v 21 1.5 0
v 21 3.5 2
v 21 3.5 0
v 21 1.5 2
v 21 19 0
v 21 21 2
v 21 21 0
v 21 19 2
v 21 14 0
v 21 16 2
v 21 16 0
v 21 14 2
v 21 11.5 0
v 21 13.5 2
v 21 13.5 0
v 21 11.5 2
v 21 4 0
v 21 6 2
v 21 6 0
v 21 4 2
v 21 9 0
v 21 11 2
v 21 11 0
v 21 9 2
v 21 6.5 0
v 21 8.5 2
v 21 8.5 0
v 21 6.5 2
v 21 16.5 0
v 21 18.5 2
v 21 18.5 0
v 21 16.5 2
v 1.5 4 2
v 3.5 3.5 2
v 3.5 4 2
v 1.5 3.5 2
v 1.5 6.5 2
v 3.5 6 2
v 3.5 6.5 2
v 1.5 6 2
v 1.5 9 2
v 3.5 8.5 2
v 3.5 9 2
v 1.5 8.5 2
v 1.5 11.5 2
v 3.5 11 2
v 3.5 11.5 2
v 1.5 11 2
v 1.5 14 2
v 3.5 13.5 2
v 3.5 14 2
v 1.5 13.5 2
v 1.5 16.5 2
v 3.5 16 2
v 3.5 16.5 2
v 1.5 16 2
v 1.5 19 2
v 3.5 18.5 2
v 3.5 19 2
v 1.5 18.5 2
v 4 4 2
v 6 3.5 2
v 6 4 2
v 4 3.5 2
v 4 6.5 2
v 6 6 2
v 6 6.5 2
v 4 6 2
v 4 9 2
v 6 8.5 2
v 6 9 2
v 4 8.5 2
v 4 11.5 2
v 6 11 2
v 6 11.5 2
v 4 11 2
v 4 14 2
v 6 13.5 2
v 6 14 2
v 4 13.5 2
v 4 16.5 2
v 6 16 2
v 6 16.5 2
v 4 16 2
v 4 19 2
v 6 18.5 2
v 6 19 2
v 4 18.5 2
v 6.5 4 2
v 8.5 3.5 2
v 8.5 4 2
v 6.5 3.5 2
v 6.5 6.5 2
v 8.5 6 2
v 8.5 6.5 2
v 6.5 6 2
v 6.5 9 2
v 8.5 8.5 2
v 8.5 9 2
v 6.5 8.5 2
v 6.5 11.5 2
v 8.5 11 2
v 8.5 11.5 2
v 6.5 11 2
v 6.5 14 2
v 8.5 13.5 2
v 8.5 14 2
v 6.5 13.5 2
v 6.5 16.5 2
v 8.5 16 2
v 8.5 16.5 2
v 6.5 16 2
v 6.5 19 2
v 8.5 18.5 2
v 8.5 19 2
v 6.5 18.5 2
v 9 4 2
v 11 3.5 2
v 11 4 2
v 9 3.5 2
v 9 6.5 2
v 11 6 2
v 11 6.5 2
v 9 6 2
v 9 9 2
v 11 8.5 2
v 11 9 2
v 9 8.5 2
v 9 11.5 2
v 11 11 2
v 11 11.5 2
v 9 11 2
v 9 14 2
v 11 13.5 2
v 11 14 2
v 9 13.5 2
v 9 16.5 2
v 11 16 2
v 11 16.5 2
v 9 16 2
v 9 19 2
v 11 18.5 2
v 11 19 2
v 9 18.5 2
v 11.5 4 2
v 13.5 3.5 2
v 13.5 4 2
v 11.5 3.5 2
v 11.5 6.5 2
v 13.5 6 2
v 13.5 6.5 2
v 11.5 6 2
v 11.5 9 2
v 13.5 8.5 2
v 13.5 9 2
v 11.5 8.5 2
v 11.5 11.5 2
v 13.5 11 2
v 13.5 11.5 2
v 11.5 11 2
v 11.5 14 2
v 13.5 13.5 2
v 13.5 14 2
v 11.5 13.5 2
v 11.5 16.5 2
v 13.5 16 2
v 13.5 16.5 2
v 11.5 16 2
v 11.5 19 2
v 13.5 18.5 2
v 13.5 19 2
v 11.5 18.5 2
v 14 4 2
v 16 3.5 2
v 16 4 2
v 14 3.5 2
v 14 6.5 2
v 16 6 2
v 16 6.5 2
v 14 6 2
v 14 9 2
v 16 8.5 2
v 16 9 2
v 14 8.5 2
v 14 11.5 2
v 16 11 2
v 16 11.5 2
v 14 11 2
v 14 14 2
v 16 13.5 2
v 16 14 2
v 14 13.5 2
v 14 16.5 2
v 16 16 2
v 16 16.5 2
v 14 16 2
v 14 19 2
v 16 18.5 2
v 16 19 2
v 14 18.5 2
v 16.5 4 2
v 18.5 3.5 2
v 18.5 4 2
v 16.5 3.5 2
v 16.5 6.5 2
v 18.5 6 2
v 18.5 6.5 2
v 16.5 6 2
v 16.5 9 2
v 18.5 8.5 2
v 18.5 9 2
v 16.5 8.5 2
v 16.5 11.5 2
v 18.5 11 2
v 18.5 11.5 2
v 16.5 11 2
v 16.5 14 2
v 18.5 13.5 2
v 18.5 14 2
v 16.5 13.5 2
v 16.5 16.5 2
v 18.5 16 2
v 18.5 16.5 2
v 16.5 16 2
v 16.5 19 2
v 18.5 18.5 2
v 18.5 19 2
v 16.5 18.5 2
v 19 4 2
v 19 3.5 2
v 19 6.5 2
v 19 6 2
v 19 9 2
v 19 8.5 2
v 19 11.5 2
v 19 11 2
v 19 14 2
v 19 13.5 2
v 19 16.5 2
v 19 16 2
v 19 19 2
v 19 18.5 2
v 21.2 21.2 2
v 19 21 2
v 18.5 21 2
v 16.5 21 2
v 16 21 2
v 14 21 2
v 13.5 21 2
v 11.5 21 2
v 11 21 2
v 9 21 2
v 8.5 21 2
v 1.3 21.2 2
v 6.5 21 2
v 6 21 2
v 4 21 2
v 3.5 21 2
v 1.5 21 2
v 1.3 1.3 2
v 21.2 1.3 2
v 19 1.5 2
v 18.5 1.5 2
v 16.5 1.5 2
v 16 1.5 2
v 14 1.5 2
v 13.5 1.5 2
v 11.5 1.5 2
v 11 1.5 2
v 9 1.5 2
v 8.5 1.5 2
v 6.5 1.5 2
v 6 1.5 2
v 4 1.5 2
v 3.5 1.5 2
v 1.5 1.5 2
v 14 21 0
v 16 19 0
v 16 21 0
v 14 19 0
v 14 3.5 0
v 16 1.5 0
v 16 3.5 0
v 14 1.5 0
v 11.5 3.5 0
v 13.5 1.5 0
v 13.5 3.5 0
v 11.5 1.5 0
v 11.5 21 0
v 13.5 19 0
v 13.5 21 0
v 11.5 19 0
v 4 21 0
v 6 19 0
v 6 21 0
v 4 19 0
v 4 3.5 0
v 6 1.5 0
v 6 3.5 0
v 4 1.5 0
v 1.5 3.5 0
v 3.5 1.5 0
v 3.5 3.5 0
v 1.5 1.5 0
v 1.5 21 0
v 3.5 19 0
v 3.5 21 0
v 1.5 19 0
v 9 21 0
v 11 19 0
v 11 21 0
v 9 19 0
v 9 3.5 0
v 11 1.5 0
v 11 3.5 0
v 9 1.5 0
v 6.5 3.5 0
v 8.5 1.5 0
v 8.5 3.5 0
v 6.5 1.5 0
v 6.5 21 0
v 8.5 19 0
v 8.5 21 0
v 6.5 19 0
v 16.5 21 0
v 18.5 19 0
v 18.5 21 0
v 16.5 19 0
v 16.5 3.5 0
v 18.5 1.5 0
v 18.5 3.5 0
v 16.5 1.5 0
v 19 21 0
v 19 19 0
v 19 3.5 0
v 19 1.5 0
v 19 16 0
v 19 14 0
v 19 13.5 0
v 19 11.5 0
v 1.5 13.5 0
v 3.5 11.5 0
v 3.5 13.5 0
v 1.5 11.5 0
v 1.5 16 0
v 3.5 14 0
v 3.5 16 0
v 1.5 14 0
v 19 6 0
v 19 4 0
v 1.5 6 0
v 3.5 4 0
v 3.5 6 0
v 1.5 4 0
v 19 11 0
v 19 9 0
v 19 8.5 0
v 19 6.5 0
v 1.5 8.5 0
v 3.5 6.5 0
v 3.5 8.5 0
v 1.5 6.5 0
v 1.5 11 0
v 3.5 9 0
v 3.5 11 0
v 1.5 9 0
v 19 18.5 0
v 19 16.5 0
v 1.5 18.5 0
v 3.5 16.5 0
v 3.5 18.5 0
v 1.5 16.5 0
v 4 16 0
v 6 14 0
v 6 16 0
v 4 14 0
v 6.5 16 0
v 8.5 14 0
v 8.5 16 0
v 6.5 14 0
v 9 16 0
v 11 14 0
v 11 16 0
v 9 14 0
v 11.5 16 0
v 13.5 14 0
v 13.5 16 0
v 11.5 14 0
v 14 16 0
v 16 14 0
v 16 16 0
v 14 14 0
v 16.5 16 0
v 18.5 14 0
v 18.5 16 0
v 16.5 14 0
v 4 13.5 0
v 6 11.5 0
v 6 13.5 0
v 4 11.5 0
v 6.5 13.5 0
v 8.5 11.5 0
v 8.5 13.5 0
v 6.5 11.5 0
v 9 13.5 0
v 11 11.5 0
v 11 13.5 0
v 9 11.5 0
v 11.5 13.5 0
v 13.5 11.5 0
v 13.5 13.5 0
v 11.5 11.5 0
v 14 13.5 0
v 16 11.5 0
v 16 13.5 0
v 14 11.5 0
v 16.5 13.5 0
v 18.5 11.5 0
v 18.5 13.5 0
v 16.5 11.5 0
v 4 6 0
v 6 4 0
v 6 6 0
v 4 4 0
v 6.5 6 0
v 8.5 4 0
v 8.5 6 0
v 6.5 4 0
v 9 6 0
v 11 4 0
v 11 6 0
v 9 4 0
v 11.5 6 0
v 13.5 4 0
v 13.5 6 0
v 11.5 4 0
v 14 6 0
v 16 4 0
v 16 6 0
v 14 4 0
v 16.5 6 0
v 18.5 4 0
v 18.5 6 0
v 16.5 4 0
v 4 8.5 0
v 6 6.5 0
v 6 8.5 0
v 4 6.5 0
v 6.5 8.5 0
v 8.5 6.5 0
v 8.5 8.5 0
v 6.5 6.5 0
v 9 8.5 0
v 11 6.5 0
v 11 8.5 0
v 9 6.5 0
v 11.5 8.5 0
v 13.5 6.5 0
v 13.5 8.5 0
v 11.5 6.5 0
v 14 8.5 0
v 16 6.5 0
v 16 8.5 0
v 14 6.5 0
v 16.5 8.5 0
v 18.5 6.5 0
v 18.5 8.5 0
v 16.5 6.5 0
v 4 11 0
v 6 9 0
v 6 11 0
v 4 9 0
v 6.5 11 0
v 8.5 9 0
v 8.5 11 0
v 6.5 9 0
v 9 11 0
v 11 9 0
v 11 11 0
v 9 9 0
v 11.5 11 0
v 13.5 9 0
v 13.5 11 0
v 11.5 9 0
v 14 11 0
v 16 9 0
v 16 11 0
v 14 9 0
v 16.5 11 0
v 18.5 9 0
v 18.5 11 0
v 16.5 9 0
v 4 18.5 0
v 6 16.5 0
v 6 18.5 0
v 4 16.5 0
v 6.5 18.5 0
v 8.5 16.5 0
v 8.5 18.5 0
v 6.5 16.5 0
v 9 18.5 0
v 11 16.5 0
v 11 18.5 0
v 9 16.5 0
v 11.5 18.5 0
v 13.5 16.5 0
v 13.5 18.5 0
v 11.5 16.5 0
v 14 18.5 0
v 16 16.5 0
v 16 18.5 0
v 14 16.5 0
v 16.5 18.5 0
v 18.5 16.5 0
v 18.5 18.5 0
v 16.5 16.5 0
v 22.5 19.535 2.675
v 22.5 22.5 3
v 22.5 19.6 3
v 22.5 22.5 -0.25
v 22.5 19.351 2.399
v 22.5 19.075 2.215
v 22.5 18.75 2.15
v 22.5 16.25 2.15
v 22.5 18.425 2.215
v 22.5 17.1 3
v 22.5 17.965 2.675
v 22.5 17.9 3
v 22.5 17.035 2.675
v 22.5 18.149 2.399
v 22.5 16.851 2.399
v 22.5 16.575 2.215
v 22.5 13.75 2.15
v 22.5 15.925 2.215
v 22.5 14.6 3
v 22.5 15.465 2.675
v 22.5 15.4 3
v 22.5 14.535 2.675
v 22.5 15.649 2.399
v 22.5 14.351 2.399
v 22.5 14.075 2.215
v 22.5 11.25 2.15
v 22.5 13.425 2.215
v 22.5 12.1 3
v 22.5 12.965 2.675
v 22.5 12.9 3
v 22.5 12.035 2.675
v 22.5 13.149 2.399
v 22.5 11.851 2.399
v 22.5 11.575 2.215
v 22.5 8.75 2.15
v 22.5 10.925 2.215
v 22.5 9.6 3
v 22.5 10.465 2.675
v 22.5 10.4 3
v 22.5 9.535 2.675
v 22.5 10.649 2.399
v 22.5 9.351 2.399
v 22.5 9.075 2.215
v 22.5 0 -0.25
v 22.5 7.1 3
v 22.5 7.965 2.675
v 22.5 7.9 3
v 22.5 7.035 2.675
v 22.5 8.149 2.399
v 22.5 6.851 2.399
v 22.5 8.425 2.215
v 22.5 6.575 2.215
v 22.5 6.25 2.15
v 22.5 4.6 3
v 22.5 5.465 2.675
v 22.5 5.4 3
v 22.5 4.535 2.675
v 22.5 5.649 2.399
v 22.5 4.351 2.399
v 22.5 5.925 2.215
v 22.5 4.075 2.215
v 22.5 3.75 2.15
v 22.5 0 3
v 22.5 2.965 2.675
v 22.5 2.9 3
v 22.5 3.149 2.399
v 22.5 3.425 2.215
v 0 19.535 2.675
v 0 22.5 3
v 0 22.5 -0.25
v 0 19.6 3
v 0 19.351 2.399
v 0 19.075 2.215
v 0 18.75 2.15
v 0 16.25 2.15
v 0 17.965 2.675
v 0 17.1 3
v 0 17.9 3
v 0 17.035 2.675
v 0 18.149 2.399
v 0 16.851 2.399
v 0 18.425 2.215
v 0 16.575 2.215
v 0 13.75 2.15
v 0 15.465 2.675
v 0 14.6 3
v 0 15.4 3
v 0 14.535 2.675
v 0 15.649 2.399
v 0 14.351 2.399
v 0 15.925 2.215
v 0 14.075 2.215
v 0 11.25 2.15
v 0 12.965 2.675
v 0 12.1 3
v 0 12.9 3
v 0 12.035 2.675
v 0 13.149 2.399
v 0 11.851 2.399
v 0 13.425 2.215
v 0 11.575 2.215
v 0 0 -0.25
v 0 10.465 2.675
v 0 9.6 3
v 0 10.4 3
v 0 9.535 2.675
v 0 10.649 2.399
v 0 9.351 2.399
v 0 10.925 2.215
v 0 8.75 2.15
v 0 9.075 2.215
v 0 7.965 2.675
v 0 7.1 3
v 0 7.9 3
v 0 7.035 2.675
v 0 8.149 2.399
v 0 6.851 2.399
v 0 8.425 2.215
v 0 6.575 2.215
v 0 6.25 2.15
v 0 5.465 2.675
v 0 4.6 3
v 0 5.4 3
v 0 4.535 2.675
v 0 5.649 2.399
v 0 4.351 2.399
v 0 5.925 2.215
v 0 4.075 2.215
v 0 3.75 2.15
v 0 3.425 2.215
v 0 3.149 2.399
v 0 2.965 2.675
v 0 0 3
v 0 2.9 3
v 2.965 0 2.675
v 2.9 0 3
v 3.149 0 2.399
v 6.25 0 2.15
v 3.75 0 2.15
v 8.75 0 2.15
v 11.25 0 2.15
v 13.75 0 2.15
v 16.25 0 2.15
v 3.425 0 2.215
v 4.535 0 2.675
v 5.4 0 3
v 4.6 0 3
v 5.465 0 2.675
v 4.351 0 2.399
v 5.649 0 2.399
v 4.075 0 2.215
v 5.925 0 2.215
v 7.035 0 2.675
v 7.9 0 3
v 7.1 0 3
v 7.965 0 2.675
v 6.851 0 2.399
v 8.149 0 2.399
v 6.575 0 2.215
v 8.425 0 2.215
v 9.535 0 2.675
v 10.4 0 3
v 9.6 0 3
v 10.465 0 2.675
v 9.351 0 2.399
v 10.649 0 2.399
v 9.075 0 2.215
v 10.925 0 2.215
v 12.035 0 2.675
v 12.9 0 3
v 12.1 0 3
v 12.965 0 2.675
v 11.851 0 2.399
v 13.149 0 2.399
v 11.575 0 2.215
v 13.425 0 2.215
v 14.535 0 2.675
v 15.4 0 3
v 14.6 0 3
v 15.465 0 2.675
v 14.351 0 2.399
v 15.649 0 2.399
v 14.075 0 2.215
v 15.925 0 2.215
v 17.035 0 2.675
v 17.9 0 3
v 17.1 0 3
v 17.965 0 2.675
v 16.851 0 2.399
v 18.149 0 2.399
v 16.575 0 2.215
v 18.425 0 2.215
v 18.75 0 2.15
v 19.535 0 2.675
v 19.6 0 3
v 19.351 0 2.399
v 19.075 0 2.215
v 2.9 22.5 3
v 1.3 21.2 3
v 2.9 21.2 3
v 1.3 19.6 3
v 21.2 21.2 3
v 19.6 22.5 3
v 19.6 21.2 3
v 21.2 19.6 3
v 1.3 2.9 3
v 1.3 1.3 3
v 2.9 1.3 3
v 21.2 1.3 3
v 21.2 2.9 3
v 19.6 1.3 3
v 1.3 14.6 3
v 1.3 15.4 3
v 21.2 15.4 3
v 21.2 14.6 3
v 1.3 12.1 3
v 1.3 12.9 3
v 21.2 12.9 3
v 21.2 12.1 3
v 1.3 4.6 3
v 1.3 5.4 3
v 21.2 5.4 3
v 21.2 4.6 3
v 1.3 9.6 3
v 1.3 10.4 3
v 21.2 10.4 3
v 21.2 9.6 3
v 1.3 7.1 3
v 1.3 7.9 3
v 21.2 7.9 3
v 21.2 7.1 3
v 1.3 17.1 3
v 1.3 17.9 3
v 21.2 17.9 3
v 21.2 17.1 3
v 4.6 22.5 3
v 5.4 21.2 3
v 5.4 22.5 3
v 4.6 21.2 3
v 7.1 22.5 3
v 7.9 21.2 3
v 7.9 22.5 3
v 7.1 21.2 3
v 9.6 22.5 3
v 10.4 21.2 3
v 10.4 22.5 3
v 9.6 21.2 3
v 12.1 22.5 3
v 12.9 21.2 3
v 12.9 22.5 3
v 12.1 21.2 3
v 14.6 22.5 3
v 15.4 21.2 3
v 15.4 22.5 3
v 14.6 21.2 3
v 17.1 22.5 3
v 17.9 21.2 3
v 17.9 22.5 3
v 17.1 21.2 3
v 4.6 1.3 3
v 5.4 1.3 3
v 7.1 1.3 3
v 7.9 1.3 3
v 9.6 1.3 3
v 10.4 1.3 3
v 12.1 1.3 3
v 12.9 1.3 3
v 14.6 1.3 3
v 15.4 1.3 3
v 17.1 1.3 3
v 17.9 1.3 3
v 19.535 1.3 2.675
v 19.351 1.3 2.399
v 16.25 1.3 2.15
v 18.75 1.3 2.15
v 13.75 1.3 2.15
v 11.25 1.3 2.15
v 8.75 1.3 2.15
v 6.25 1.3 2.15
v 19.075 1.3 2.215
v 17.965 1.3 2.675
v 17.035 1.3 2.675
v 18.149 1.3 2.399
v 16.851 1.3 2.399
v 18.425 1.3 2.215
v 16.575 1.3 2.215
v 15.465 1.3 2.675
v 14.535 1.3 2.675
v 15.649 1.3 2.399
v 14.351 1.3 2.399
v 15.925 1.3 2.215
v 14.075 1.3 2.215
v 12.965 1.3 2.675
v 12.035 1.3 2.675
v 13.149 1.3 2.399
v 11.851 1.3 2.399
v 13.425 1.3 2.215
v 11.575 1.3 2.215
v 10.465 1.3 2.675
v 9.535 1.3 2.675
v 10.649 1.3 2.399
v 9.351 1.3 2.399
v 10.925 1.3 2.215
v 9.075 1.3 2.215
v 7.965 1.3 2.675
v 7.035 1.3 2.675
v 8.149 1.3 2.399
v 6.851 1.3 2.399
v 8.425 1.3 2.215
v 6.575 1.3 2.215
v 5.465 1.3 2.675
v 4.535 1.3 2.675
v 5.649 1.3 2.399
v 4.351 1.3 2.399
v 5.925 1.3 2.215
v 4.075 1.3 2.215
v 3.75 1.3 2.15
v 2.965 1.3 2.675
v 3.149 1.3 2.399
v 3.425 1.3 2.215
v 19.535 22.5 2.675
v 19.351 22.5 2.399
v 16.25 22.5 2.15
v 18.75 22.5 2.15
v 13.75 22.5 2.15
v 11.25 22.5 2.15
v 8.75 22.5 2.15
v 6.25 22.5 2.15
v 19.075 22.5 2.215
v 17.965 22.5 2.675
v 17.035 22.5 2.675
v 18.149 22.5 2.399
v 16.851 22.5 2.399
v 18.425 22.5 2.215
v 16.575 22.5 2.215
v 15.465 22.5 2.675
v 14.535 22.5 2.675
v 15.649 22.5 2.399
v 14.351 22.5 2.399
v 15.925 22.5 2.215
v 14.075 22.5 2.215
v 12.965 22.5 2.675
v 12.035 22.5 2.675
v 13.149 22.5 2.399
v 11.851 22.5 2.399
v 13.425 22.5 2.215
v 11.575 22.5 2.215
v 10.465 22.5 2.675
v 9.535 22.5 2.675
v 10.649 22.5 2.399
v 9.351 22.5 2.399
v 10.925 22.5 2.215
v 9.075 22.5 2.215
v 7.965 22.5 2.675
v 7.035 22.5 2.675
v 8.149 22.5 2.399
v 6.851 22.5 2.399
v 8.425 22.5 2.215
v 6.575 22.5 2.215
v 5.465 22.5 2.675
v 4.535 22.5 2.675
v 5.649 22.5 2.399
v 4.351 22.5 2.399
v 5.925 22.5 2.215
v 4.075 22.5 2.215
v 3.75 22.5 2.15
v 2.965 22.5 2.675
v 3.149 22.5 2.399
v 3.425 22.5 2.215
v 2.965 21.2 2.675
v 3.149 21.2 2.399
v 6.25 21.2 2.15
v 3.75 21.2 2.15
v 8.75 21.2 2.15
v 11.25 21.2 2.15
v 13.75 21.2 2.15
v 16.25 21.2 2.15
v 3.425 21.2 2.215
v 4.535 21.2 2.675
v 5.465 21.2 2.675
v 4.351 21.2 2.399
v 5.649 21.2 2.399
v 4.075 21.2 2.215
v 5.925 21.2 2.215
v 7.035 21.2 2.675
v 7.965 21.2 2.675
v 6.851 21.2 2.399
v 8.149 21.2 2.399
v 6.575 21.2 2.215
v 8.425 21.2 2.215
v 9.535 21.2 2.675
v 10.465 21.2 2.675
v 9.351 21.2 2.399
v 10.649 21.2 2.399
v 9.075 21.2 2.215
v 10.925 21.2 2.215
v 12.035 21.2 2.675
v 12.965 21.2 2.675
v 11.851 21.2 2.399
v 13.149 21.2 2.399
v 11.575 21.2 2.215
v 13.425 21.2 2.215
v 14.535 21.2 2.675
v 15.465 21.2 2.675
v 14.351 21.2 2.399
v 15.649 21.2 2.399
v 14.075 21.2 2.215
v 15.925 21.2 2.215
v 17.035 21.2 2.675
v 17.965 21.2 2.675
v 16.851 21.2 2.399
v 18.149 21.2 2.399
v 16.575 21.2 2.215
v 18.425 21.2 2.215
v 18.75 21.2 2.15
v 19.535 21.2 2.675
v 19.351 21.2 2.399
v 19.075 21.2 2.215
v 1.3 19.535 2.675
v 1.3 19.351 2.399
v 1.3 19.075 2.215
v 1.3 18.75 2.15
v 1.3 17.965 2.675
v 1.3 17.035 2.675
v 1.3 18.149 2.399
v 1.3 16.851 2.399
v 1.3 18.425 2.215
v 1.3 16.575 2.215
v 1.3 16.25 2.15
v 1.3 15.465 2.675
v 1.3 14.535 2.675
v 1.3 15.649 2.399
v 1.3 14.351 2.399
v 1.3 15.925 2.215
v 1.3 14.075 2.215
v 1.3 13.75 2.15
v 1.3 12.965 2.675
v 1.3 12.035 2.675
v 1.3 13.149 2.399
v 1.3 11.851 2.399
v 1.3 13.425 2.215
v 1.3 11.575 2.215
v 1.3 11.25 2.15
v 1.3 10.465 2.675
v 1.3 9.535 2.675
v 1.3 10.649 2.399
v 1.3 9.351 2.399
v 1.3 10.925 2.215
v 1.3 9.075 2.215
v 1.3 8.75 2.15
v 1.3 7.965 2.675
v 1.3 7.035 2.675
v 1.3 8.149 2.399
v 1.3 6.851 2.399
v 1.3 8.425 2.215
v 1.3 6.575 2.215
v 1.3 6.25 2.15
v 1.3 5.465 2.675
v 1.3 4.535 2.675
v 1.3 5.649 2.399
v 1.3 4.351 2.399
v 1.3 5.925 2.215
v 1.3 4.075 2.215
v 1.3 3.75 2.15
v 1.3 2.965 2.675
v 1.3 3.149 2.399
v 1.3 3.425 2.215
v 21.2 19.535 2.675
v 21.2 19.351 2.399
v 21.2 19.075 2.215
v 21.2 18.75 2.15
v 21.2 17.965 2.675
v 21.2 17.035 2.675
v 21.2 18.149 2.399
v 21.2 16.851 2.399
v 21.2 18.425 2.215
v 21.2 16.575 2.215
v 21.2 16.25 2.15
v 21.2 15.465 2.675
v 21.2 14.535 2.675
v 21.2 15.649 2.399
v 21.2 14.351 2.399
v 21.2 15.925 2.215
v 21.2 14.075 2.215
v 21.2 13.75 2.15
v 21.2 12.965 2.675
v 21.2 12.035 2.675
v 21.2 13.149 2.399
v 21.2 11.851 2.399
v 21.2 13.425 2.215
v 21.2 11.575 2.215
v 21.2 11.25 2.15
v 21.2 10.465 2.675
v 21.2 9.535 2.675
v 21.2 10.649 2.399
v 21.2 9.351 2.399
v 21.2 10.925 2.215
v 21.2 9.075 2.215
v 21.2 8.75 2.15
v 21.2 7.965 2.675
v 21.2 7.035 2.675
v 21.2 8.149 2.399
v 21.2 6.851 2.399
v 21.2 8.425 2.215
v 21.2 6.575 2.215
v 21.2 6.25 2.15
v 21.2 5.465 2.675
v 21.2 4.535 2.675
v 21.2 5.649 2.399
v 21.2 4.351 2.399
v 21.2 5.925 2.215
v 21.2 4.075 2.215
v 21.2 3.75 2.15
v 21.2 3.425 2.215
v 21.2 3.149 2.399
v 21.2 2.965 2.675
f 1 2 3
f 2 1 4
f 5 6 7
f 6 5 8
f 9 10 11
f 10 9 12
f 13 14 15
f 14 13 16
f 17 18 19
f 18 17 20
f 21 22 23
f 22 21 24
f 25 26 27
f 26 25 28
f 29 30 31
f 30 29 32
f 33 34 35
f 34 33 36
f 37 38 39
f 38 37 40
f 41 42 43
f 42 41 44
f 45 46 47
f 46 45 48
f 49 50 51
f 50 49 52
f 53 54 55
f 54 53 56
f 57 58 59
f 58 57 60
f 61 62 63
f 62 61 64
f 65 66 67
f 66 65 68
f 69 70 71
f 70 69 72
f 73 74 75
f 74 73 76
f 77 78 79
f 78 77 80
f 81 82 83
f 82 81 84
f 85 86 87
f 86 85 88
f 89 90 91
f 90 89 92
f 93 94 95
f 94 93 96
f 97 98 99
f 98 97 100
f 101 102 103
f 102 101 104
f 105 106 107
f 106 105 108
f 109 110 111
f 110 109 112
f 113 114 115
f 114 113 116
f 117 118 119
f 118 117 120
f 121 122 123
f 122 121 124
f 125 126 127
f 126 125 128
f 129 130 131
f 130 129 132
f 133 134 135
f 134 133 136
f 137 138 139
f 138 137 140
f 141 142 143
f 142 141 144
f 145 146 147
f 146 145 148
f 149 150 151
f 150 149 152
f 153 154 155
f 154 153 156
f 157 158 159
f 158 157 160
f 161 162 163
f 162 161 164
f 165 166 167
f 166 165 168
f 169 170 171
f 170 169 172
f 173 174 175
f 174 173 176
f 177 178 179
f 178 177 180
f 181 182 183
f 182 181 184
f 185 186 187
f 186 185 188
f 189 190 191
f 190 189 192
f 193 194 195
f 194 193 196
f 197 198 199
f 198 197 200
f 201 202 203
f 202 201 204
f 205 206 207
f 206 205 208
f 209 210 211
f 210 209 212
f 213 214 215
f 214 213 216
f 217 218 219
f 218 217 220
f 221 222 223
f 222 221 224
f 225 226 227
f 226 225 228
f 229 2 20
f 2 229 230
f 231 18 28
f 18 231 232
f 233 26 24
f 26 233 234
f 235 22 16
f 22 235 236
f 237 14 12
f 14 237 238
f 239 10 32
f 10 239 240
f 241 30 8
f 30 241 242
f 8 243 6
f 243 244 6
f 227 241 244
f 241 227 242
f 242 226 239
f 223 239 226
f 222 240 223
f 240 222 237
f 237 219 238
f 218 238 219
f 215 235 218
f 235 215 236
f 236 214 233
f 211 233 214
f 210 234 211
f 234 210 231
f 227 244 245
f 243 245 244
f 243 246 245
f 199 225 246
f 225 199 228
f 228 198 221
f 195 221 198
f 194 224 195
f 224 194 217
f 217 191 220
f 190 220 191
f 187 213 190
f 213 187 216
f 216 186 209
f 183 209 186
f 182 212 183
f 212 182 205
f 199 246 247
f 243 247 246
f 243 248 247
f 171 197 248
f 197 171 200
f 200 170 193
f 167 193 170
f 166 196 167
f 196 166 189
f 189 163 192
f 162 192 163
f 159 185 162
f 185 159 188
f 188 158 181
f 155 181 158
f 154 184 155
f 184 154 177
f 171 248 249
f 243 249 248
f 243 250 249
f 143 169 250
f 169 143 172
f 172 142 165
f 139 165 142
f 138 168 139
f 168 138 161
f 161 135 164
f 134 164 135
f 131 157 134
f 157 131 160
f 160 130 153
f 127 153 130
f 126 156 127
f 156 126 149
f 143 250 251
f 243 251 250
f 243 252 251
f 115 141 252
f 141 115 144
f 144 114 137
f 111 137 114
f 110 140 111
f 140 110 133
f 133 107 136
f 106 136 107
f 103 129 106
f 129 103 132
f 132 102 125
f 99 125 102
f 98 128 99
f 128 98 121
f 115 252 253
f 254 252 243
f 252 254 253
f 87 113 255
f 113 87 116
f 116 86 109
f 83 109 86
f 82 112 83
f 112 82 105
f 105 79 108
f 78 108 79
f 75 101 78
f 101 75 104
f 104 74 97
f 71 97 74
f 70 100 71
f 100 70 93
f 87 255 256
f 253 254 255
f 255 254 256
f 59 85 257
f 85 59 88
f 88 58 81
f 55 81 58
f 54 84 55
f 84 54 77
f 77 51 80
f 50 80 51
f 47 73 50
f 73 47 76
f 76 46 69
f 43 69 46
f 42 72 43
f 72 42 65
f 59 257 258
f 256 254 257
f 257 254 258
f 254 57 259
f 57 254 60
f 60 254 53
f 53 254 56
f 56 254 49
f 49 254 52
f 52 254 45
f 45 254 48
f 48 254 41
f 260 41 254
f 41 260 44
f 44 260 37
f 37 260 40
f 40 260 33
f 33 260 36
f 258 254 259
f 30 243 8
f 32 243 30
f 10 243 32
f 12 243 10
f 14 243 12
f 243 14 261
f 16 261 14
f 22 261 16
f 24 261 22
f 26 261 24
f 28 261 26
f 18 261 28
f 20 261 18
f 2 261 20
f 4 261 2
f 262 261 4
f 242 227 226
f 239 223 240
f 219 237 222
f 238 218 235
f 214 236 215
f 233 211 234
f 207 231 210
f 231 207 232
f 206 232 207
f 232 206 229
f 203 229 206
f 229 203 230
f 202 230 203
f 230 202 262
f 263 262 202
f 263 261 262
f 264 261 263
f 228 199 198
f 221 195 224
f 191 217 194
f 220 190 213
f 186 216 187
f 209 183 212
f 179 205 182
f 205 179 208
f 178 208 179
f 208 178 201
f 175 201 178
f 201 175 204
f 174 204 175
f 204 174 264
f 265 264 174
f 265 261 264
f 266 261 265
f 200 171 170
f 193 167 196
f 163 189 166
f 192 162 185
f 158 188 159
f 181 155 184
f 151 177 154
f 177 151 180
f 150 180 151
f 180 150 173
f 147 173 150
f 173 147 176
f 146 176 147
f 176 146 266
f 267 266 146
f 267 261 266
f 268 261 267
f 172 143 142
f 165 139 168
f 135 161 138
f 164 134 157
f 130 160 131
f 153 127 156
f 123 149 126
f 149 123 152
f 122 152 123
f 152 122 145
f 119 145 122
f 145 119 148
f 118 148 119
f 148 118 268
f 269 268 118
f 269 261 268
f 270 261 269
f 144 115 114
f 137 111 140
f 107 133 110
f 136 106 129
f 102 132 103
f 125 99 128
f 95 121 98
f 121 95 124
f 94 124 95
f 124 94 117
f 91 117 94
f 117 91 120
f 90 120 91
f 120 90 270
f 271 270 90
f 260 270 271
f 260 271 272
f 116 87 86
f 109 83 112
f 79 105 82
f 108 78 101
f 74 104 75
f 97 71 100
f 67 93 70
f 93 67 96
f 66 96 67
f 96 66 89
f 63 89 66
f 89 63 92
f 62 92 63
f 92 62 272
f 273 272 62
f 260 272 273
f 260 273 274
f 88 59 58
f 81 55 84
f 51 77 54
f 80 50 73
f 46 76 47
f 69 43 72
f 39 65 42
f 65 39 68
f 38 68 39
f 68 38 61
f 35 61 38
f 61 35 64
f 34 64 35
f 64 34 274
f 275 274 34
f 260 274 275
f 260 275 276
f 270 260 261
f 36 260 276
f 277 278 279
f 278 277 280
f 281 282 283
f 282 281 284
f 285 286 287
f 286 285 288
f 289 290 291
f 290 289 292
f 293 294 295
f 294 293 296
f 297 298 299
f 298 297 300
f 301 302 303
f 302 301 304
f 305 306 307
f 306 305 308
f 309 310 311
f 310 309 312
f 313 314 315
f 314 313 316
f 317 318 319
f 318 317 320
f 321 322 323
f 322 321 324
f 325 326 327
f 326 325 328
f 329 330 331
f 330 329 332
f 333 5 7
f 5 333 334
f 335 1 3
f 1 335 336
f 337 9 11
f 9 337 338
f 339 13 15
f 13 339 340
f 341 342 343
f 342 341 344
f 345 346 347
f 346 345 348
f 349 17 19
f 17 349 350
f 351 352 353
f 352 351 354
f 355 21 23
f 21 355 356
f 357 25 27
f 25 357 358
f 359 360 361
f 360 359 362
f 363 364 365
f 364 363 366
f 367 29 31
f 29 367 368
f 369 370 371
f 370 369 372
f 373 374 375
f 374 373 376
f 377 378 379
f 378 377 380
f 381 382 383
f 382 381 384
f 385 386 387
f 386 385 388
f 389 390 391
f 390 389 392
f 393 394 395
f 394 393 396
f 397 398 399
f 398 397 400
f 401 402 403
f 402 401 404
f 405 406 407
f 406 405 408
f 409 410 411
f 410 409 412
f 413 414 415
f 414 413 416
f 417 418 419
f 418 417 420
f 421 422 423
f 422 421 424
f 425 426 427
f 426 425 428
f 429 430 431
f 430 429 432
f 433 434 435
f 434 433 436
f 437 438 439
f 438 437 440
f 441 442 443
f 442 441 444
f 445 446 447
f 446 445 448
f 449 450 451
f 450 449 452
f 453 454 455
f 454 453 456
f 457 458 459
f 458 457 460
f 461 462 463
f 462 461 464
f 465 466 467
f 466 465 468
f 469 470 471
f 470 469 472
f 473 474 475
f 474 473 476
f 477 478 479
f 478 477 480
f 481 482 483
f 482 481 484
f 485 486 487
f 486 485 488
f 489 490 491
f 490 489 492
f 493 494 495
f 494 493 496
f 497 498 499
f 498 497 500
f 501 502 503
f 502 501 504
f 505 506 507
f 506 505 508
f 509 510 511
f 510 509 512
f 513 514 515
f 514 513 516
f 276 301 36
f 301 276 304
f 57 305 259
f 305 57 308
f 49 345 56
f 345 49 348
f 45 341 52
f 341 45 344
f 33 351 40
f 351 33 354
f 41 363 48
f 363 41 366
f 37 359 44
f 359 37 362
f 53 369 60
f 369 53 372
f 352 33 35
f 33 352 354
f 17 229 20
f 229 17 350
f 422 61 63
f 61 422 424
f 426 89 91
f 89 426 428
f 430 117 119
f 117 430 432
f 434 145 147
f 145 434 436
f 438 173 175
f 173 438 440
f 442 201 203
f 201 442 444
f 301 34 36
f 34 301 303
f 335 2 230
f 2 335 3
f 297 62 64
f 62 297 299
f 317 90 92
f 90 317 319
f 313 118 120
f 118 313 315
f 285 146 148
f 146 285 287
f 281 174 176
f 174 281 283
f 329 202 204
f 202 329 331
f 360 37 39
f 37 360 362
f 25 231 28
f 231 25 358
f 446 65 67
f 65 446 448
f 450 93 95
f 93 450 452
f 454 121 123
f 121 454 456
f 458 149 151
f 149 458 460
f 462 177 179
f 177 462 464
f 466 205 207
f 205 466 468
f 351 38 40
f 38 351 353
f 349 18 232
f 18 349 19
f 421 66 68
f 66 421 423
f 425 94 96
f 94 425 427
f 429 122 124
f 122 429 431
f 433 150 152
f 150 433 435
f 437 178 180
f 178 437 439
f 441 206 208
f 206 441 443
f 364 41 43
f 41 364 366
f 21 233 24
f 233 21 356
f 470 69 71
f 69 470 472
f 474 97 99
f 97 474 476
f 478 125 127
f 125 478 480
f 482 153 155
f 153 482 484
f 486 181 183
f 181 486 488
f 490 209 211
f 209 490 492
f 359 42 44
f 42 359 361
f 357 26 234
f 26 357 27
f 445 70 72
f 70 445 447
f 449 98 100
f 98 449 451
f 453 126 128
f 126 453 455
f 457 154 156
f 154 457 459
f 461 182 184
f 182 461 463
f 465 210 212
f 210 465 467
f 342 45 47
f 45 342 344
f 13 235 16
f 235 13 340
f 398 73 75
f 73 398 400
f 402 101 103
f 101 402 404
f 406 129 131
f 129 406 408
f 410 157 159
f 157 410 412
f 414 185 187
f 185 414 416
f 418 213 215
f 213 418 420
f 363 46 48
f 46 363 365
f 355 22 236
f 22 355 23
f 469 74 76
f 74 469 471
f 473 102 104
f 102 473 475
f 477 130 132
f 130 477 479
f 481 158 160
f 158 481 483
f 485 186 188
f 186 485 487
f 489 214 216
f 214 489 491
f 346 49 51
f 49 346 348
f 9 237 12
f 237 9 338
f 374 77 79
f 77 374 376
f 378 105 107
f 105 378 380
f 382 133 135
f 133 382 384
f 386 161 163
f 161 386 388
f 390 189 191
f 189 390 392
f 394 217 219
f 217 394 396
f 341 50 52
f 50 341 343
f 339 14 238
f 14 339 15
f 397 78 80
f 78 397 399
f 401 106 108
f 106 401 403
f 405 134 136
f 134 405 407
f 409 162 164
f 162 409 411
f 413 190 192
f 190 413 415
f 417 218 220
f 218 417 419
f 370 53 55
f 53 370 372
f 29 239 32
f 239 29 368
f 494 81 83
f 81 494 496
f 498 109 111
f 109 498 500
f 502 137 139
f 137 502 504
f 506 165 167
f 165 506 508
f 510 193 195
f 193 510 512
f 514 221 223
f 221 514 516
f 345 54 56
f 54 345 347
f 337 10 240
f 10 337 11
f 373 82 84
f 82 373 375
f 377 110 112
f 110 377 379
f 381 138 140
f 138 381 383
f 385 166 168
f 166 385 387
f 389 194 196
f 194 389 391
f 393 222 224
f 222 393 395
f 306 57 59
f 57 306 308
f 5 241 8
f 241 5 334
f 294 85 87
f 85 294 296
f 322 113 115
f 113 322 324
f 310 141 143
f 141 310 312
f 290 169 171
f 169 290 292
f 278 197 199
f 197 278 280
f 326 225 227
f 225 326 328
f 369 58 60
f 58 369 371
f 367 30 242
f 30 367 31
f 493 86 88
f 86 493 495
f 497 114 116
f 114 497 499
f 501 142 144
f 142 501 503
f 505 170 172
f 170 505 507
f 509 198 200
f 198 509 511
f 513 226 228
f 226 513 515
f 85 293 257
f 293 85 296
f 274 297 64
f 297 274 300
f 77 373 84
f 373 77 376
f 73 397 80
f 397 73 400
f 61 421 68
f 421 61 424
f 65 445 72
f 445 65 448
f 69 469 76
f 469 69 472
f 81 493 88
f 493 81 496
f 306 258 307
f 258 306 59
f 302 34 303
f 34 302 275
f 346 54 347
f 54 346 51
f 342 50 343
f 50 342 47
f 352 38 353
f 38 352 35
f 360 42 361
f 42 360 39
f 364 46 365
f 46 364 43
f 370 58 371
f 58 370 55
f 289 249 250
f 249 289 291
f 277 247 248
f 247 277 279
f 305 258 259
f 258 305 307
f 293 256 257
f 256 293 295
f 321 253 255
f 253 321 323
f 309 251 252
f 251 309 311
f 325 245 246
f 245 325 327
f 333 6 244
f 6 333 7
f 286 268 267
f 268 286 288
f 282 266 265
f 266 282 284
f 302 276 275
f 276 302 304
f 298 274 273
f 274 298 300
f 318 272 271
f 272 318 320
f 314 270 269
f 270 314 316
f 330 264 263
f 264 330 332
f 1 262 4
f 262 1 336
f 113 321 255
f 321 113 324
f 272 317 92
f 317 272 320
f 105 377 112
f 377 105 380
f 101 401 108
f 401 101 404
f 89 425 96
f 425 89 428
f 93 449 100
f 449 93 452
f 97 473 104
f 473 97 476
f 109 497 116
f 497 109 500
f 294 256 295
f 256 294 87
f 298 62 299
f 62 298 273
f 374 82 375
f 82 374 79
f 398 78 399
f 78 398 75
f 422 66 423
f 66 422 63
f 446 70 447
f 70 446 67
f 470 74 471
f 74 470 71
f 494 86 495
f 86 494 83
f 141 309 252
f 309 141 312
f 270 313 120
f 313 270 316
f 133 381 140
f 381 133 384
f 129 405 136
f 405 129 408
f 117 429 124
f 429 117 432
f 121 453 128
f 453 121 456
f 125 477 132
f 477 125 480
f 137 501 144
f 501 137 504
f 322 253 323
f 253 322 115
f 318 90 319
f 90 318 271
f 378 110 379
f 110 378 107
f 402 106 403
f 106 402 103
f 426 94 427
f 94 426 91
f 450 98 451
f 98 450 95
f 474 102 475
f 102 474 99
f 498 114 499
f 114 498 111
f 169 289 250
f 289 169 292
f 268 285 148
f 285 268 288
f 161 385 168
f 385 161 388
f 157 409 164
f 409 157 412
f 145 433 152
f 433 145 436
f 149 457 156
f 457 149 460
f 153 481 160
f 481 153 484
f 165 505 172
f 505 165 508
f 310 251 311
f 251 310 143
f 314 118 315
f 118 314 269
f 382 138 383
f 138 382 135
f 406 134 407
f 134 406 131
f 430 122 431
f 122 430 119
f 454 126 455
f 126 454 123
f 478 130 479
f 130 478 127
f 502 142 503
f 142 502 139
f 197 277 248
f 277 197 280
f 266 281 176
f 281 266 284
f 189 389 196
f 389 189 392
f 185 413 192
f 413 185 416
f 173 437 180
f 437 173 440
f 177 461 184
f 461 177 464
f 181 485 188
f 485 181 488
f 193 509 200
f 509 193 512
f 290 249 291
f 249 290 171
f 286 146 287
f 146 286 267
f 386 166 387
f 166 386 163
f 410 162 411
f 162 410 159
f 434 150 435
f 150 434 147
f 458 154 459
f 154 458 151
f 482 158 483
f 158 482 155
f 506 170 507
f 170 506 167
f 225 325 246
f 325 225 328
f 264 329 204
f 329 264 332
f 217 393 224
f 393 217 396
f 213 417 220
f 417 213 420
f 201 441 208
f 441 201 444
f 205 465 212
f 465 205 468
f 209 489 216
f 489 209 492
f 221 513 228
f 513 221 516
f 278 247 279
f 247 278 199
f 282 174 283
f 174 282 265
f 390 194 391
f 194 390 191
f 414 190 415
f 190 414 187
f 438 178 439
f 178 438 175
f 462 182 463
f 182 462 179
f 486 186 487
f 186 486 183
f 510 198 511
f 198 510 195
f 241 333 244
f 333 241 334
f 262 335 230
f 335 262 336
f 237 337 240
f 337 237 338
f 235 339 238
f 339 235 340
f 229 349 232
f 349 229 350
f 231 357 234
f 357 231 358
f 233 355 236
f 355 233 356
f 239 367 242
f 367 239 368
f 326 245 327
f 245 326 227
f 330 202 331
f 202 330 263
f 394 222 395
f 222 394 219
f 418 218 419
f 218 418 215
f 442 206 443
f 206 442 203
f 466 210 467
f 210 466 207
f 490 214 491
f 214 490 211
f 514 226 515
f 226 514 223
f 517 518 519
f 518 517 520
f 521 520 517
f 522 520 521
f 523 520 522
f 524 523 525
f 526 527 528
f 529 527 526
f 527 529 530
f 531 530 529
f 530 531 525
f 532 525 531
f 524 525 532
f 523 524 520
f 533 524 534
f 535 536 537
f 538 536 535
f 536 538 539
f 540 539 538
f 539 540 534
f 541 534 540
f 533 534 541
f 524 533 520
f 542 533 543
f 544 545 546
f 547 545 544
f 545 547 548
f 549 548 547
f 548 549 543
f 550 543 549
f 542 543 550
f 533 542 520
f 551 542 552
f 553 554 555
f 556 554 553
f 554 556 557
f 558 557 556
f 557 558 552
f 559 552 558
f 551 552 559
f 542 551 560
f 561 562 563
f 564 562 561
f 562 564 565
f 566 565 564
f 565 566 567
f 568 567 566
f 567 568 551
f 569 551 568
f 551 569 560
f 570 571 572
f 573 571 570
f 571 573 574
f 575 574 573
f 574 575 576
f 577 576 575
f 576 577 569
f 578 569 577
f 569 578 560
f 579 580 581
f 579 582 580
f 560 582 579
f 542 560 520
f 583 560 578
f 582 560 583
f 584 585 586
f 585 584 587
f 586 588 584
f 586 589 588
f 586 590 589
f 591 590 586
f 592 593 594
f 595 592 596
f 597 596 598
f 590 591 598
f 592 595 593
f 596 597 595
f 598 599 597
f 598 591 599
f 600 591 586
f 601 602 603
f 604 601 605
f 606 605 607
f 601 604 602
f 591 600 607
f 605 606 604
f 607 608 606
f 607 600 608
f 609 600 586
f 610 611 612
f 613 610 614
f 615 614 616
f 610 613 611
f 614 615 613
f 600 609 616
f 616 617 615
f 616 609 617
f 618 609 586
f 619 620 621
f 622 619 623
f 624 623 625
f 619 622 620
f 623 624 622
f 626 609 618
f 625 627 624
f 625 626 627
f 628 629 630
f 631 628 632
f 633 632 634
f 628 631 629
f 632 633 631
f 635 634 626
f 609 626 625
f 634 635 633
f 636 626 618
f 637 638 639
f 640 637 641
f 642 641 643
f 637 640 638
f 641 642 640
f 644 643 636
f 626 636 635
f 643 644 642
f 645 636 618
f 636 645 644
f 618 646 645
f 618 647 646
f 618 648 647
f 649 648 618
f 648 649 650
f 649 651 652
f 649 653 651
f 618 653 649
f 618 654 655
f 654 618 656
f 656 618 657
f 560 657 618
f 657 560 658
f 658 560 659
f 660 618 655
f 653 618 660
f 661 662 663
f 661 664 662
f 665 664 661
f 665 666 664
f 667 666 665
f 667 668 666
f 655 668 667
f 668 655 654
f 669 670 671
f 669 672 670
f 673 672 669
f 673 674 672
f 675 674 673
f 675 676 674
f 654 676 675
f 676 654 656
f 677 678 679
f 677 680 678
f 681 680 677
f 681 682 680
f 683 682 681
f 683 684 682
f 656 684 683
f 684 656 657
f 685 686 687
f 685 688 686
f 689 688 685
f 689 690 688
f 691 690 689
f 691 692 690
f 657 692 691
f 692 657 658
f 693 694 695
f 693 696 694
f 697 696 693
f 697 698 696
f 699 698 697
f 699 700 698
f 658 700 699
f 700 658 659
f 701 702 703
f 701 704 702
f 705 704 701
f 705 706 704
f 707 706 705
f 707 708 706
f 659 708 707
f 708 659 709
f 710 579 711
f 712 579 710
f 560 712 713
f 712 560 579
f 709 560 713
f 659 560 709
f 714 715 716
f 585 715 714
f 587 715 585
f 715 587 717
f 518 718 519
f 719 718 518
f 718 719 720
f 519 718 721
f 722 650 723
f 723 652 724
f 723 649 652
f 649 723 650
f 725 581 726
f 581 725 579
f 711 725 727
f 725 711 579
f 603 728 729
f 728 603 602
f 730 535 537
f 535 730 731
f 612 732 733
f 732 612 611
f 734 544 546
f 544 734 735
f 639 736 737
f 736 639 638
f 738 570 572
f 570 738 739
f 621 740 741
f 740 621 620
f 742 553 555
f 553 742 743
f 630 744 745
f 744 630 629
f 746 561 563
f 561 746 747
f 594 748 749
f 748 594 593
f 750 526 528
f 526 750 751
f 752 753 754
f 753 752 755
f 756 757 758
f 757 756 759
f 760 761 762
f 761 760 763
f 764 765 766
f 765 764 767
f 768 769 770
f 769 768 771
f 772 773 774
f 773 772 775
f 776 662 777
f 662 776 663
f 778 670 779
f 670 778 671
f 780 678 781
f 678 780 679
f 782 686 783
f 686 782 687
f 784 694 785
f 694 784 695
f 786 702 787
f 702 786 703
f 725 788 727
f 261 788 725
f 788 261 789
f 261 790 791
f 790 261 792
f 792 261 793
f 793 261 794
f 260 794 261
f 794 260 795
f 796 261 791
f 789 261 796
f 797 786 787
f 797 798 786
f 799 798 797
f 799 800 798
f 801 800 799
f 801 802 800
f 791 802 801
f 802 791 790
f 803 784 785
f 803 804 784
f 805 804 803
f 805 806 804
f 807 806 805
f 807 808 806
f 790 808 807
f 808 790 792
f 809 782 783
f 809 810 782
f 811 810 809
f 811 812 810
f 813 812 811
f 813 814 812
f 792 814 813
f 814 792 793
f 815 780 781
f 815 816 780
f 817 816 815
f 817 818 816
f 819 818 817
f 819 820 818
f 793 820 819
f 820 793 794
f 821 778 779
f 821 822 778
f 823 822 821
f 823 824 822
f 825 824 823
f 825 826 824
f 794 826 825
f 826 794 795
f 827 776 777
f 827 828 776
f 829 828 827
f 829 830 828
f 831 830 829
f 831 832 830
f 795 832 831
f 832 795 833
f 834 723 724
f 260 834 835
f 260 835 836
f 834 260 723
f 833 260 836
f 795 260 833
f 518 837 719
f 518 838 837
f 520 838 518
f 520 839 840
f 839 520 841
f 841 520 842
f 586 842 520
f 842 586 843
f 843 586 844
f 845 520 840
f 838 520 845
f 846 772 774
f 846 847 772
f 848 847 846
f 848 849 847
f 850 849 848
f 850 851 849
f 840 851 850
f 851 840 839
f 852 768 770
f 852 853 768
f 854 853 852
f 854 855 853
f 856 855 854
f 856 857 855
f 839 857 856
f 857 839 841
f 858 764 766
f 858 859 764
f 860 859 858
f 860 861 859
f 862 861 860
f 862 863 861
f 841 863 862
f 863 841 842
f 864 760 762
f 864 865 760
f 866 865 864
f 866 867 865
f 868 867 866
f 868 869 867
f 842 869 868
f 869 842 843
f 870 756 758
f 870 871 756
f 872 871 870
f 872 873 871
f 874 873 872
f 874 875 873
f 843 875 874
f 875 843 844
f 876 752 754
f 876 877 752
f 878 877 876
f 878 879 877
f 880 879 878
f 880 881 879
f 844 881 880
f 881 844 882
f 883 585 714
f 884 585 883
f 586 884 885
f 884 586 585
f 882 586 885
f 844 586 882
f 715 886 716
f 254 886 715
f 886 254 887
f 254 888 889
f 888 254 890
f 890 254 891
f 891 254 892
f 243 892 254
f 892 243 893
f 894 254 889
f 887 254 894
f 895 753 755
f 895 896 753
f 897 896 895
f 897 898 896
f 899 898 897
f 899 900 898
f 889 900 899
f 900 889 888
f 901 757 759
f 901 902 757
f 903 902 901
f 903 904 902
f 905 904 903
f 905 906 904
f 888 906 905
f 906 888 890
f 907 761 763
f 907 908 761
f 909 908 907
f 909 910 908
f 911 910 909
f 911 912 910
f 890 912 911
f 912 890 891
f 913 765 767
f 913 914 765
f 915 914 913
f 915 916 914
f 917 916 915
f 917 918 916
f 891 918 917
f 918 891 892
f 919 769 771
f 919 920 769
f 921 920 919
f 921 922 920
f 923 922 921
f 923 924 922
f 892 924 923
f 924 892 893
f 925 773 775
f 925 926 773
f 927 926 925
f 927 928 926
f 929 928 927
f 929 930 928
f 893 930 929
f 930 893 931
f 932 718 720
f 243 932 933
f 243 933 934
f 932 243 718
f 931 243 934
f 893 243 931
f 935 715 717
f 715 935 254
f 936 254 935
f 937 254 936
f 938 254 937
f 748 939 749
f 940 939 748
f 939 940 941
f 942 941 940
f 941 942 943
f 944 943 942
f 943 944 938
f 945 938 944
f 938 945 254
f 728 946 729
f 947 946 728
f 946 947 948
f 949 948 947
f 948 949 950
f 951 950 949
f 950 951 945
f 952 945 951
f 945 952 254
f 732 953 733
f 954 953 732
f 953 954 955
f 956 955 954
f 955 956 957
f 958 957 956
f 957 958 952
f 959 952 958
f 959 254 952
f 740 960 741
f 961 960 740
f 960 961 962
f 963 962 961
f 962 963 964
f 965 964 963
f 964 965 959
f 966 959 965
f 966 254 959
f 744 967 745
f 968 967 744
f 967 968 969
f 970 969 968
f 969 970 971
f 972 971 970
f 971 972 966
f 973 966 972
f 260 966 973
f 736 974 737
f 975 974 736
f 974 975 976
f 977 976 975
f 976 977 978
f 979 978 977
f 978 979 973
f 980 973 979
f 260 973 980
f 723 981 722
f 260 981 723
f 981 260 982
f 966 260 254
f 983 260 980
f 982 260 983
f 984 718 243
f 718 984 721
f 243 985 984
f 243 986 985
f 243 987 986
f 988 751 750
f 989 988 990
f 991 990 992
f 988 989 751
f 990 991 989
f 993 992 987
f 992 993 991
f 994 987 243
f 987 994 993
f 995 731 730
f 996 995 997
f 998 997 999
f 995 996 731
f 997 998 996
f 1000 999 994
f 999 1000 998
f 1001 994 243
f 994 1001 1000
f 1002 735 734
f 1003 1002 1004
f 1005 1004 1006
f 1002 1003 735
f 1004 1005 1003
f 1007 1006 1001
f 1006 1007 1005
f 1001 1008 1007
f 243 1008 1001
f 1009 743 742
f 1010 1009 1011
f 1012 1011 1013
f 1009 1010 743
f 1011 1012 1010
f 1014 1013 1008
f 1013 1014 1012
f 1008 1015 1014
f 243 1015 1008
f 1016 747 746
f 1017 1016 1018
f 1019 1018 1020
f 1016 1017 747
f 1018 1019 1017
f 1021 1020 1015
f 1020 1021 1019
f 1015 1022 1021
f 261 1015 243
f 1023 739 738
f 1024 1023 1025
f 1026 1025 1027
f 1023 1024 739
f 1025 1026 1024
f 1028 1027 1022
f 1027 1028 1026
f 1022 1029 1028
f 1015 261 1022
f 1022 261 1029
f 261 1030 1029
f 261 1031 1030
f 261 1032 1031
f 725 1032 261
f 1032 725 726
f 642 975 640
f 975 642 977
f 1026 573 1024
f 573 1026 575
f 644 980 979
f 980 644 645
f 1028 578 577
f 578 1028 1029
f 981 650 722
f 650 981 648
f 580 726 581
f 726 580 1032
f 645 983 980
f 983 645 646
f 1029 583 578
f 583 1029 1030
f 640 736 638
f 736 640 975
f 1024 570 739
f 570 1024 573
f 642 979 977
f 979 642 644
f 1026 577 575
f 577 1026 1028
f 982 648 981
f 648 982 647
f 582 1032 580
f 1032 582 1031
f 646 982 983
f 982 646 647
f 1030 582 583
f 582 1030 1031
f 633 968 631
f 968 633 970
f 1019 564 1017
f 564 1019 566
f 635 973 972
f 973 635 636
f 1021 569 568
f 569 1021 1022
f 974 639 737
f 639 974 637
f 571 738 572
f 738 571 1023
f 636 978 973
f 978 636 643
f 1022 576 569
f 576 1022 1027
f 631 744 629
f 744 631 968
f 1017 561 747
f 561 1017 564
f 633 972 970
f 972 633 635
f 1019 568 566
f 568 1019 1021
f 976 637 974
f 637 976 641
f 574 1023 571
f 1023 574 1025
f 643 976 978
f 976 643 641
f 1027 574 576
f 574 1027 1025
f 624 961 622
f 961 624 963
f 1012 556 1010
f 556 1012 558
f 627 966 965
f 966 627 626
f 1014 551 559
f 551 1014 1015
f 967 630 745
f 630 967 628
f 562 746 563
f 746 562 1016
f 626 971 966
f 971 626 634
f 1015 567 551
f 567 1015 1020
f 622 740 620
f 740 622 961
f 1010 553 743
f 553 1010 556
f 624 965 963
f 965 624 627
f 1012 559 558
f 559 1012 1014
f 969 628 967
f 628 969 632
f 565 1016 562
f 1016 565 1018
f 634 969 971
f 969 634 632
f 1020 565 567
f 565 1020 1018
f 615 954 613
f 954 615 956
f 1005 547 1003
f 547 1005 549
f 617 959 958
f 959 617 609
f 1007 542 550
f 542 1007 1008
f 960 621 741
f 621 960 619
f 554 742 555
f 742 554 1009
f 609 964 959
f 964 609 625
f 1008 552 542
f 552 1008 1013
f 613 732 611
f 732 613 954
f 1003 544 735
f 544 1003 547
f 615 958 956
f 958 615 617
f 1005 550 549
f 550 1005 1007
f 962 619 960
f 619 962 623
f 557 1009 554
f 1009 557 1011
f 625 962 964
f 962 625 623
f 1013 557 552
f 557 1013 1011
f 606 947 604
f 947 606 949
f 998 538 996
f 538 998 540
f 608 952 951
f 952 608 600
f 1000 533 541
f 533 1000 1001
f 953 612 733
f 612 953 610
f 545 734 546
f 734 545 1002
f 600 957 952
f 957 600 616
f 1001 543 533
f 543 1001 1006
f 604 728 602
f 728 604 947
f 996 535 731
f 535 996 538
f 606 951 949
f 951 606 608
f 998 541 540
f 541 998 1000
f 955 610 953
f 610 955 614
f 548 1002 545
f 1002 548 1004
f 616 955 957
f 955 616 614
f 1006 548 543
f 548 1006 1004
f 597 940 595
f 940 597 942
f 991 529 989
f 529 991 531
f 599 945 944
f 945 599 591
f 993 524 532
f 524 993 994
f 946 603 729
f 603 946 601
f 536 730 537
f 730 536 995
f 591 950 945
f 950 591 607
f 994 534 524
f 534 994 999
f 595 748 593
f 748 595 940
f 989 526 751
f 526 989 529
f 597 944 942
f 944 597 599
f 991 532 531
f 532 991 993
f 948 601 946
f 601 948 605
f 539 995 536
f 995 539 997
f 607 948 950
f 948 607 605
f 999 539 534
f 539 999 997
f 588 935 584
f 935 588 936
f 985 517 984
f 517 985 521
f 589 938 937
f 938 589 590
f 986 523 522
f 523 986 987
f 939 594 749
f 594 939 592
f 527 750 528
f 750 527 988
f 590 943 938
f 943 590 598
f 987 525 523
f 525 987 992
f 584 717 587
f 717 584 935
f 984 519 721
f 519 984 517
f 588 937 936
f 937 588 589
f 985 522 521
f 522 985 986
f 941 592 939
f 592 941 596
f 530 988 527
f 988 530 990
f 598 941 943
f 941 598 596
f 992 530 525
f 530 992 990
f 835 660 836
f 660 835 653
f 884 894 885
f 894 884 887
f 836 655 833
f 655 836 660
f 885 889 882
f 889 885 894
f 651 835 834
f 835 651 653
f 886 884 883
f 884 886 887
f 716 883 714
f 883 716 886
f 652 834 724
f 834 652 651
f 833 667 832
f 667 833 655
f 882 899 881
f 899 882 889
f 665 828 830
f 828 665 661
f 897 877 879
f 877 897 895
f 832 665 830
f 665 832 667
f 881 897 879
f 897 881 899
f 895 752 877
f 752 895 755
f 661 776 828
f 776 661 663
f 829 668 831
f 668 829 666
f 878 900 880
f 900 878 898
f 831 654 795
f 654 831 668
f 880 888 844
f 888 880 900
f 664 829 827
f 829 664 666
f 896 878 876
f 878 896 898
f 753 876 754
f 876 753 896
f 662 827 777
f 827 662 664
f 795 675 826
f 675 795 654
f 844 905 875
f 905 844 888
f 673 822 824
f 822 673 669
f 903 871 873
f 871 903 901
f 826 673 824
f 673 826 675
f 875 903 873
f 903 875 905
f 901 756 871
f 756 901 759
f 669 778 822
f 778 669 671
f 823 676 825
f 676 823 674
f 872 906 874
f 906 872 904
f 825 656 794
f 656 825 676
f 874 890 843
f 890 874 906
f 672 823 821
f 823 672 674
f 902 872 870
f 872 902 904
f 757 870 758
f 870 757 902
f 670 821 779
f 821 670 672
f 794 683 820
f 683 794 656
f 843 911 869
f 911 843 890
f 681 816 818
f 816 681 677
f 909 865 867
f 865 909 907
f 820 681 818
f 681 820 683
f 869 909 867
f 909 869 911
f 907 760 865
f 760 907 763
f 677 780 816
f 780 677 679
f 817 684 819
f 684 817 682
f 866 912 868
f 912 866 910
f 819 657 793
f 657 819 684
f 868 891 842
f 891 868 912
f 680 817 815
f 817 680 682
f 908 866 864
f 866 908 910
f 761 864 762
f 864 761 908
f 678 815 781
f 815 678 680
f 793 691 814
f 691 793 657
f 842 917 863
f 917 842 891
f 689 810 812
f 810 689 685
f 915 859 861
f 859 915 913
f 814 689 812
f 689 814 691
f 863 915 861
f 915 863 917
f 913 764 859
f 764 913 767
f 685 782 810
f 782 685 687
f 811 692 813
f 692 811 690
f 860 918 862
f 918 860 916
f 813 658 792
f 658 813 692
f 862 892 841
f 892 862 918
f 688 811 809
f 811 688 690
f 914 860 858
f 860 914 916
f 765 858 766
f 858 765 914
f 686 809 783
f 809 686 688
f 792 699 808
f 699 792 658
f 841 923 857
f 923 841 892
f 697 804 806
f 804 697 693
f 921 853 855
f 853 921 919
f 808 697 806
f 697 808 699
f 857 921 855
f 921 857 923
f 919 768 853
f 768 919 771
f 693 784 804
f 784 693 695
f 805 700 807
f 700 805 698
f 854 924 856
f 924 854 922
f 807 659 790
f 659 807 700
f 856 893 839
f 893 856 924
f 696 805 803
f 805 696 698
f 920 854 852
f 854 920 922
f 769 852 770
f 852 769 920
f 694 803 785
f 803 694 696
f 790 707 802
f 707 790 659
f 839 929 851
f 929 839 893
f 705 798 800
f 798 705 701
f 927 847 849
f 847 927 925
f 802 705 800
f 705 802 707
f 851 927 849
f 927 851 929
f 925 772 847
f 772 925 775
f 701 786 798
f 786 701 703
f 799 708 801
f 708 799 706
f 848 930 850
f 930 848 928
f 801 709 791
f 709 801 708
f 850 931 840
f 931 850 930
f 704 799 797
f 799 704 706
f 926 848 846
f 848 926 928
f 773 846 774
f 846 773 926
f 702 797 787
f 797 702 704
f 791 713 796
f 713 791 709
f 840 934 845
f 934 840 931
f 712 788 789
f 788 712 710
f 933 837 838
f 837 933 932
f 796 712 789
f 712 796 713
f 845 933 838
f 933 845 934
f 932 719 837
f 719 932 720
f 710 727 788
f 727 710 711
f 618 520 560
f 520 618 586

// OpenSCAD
grid_size_x = 8; // number of pixels on x
grid_size_y = 8; // number of pixels on y

cell_size = 2.5; // pitch between pixels
inner_wall_thickness = 0.5; // I think you get this one
outer_wall_thickness = 1.5; //this one too
inner_wall_height = 2; // minimum TBD by experimentation
outer_wall_height = inner_wall_height + 1;
pcb_tolerance = 0.2; //wiggle room for pcb

hole_size = 0.85; // size for solder joint holes

module grid() { // make readable code they said... 
  
    translate([0, 0, 0])
            cube([grid_size_y * cell_size - inner_wall_thickness + 2 * outer_wall_thickness, outer_wall_thickness, inner_wall_height]);
    translate([0, 0, inner_wall_height])
            cube([grid_size_y * cell_size - inner_wall_thickness + 2 * outer_wall_thickness, outer_wall_thickness - pcb_tolerance, outer_wall_height - inner_wall_height]);
    
    for (y = [1 : 1 : grid_size_x -1]) {
        translate([outer_wall_thickness, y * cell_size + outer_wall_thickness - inner_wall_thickness, 0])
            cube([grid_size_y * cell_size - inner_wall_thickness, inner_wall_thickness, inner_wall_height]);
    }
    
    translate([0, grid_size_x * cell_size + outer_wall_thickness - inner_wall_thickness, 0])
            cube([grid_size_y * cell_size - inner_wall_thickness + 2 * outer_wall_thickness, outer_wall_thickness, inner_wall_height]);
    translate([0, grid_size_x * cell_size + outer_wall_thickness - inner_wall_thickness + pcb_tolerance, inner_wall_height])
           cube([grid_size_y * cell_size - inner_wall_thickness + 2 * outer_wall_thickness, outer_wall_thickness - pcb_tolerance, outer_wall_height - inner_wall_height]);
    
    
    translate([0, 0, 0])
            cube([outer_wall_thickness, grid_size_x * cell_size - inner_wall_thickness + 2 * outer_wall_thickness, inner_wall_height]); 
    translate([0, 0, inner_wall_height])
            cube([outer_wall_thickness - pcb_tolerance, grid_size_x * cell_size - inner_wall_thickness + 2 * outer_wall_thickness, outer_wall_height - inner_wall_height]);
    
    for (x = [1 : 1 : grid_size_y - 1]) {
        translate([x * cell_size + outer_wall_thickness -inner_wall_thickness, outer_wall_thickness, 0])
            cube([inner_wall_thickness, grid_size_x * cell_size - inner_wall_thickness, inner_wall_height]);
    }
    
    translate([grid_size_y * cell_size + outer_wall_thickness - inner_wall_thickness, 0, 0])
            cube([outer_wall_thickness, grid_size_x * cell_size - inner_wall_thickness + 2 * outer_wall_thickness, inner_wall_height]);
    translate([grid_size_y * cell_size + outer_wall_thickness - inner_wall_thickness + pcb_tolerance, 0, inner_wall_height])
            cube([outer_wall_thickness - pcb_tolerance, grid_size_x * cell_size - inner_wall_thickness + 2 * outer_wall_thickness, outer_wall_height - inner_wall_height]);
}

diffusion_thickness = 0.25; //diffusion layer thickness, set to first layer height for your nozzle

translate([0,0,-diffusion_thickness])
color("white") cube([grid_size_y*cell_size+outer_wall_thickness*2 - inner_wall_thickness,grid_size_x*cell_size+outer_wall_thickness*2 - inner_wall_thickness,diffusion_thickness]); //white diffusion layer, 
 
 color([0.9,0.8,1]) difference() { //holes for soldering the module on a different pcb
     grid();
     for (y = [1 : 1 : grid_size_x -1]) {
        translate([-0.1, y * cell_size + outer_wall_thickness - inner_wall_thickness/2, outer_wall_height])
        rotate([0,90,0])
        cylinder(r=hole_size, h=cell_size * (grid_size_y + 2), $fn=16);
    }
    for (y = [1 : 1 : grid_size_y -1]) {
        translate([y * cell_size + outer_wall_thickness - inner_wall_thickness/2, -0.1, outer_wall_height])
        rotate([0,90,90])
        cylinder(r=hole_size, h=cell_size * (grid_size_y + 2), $fn=16);
    }
     
}
